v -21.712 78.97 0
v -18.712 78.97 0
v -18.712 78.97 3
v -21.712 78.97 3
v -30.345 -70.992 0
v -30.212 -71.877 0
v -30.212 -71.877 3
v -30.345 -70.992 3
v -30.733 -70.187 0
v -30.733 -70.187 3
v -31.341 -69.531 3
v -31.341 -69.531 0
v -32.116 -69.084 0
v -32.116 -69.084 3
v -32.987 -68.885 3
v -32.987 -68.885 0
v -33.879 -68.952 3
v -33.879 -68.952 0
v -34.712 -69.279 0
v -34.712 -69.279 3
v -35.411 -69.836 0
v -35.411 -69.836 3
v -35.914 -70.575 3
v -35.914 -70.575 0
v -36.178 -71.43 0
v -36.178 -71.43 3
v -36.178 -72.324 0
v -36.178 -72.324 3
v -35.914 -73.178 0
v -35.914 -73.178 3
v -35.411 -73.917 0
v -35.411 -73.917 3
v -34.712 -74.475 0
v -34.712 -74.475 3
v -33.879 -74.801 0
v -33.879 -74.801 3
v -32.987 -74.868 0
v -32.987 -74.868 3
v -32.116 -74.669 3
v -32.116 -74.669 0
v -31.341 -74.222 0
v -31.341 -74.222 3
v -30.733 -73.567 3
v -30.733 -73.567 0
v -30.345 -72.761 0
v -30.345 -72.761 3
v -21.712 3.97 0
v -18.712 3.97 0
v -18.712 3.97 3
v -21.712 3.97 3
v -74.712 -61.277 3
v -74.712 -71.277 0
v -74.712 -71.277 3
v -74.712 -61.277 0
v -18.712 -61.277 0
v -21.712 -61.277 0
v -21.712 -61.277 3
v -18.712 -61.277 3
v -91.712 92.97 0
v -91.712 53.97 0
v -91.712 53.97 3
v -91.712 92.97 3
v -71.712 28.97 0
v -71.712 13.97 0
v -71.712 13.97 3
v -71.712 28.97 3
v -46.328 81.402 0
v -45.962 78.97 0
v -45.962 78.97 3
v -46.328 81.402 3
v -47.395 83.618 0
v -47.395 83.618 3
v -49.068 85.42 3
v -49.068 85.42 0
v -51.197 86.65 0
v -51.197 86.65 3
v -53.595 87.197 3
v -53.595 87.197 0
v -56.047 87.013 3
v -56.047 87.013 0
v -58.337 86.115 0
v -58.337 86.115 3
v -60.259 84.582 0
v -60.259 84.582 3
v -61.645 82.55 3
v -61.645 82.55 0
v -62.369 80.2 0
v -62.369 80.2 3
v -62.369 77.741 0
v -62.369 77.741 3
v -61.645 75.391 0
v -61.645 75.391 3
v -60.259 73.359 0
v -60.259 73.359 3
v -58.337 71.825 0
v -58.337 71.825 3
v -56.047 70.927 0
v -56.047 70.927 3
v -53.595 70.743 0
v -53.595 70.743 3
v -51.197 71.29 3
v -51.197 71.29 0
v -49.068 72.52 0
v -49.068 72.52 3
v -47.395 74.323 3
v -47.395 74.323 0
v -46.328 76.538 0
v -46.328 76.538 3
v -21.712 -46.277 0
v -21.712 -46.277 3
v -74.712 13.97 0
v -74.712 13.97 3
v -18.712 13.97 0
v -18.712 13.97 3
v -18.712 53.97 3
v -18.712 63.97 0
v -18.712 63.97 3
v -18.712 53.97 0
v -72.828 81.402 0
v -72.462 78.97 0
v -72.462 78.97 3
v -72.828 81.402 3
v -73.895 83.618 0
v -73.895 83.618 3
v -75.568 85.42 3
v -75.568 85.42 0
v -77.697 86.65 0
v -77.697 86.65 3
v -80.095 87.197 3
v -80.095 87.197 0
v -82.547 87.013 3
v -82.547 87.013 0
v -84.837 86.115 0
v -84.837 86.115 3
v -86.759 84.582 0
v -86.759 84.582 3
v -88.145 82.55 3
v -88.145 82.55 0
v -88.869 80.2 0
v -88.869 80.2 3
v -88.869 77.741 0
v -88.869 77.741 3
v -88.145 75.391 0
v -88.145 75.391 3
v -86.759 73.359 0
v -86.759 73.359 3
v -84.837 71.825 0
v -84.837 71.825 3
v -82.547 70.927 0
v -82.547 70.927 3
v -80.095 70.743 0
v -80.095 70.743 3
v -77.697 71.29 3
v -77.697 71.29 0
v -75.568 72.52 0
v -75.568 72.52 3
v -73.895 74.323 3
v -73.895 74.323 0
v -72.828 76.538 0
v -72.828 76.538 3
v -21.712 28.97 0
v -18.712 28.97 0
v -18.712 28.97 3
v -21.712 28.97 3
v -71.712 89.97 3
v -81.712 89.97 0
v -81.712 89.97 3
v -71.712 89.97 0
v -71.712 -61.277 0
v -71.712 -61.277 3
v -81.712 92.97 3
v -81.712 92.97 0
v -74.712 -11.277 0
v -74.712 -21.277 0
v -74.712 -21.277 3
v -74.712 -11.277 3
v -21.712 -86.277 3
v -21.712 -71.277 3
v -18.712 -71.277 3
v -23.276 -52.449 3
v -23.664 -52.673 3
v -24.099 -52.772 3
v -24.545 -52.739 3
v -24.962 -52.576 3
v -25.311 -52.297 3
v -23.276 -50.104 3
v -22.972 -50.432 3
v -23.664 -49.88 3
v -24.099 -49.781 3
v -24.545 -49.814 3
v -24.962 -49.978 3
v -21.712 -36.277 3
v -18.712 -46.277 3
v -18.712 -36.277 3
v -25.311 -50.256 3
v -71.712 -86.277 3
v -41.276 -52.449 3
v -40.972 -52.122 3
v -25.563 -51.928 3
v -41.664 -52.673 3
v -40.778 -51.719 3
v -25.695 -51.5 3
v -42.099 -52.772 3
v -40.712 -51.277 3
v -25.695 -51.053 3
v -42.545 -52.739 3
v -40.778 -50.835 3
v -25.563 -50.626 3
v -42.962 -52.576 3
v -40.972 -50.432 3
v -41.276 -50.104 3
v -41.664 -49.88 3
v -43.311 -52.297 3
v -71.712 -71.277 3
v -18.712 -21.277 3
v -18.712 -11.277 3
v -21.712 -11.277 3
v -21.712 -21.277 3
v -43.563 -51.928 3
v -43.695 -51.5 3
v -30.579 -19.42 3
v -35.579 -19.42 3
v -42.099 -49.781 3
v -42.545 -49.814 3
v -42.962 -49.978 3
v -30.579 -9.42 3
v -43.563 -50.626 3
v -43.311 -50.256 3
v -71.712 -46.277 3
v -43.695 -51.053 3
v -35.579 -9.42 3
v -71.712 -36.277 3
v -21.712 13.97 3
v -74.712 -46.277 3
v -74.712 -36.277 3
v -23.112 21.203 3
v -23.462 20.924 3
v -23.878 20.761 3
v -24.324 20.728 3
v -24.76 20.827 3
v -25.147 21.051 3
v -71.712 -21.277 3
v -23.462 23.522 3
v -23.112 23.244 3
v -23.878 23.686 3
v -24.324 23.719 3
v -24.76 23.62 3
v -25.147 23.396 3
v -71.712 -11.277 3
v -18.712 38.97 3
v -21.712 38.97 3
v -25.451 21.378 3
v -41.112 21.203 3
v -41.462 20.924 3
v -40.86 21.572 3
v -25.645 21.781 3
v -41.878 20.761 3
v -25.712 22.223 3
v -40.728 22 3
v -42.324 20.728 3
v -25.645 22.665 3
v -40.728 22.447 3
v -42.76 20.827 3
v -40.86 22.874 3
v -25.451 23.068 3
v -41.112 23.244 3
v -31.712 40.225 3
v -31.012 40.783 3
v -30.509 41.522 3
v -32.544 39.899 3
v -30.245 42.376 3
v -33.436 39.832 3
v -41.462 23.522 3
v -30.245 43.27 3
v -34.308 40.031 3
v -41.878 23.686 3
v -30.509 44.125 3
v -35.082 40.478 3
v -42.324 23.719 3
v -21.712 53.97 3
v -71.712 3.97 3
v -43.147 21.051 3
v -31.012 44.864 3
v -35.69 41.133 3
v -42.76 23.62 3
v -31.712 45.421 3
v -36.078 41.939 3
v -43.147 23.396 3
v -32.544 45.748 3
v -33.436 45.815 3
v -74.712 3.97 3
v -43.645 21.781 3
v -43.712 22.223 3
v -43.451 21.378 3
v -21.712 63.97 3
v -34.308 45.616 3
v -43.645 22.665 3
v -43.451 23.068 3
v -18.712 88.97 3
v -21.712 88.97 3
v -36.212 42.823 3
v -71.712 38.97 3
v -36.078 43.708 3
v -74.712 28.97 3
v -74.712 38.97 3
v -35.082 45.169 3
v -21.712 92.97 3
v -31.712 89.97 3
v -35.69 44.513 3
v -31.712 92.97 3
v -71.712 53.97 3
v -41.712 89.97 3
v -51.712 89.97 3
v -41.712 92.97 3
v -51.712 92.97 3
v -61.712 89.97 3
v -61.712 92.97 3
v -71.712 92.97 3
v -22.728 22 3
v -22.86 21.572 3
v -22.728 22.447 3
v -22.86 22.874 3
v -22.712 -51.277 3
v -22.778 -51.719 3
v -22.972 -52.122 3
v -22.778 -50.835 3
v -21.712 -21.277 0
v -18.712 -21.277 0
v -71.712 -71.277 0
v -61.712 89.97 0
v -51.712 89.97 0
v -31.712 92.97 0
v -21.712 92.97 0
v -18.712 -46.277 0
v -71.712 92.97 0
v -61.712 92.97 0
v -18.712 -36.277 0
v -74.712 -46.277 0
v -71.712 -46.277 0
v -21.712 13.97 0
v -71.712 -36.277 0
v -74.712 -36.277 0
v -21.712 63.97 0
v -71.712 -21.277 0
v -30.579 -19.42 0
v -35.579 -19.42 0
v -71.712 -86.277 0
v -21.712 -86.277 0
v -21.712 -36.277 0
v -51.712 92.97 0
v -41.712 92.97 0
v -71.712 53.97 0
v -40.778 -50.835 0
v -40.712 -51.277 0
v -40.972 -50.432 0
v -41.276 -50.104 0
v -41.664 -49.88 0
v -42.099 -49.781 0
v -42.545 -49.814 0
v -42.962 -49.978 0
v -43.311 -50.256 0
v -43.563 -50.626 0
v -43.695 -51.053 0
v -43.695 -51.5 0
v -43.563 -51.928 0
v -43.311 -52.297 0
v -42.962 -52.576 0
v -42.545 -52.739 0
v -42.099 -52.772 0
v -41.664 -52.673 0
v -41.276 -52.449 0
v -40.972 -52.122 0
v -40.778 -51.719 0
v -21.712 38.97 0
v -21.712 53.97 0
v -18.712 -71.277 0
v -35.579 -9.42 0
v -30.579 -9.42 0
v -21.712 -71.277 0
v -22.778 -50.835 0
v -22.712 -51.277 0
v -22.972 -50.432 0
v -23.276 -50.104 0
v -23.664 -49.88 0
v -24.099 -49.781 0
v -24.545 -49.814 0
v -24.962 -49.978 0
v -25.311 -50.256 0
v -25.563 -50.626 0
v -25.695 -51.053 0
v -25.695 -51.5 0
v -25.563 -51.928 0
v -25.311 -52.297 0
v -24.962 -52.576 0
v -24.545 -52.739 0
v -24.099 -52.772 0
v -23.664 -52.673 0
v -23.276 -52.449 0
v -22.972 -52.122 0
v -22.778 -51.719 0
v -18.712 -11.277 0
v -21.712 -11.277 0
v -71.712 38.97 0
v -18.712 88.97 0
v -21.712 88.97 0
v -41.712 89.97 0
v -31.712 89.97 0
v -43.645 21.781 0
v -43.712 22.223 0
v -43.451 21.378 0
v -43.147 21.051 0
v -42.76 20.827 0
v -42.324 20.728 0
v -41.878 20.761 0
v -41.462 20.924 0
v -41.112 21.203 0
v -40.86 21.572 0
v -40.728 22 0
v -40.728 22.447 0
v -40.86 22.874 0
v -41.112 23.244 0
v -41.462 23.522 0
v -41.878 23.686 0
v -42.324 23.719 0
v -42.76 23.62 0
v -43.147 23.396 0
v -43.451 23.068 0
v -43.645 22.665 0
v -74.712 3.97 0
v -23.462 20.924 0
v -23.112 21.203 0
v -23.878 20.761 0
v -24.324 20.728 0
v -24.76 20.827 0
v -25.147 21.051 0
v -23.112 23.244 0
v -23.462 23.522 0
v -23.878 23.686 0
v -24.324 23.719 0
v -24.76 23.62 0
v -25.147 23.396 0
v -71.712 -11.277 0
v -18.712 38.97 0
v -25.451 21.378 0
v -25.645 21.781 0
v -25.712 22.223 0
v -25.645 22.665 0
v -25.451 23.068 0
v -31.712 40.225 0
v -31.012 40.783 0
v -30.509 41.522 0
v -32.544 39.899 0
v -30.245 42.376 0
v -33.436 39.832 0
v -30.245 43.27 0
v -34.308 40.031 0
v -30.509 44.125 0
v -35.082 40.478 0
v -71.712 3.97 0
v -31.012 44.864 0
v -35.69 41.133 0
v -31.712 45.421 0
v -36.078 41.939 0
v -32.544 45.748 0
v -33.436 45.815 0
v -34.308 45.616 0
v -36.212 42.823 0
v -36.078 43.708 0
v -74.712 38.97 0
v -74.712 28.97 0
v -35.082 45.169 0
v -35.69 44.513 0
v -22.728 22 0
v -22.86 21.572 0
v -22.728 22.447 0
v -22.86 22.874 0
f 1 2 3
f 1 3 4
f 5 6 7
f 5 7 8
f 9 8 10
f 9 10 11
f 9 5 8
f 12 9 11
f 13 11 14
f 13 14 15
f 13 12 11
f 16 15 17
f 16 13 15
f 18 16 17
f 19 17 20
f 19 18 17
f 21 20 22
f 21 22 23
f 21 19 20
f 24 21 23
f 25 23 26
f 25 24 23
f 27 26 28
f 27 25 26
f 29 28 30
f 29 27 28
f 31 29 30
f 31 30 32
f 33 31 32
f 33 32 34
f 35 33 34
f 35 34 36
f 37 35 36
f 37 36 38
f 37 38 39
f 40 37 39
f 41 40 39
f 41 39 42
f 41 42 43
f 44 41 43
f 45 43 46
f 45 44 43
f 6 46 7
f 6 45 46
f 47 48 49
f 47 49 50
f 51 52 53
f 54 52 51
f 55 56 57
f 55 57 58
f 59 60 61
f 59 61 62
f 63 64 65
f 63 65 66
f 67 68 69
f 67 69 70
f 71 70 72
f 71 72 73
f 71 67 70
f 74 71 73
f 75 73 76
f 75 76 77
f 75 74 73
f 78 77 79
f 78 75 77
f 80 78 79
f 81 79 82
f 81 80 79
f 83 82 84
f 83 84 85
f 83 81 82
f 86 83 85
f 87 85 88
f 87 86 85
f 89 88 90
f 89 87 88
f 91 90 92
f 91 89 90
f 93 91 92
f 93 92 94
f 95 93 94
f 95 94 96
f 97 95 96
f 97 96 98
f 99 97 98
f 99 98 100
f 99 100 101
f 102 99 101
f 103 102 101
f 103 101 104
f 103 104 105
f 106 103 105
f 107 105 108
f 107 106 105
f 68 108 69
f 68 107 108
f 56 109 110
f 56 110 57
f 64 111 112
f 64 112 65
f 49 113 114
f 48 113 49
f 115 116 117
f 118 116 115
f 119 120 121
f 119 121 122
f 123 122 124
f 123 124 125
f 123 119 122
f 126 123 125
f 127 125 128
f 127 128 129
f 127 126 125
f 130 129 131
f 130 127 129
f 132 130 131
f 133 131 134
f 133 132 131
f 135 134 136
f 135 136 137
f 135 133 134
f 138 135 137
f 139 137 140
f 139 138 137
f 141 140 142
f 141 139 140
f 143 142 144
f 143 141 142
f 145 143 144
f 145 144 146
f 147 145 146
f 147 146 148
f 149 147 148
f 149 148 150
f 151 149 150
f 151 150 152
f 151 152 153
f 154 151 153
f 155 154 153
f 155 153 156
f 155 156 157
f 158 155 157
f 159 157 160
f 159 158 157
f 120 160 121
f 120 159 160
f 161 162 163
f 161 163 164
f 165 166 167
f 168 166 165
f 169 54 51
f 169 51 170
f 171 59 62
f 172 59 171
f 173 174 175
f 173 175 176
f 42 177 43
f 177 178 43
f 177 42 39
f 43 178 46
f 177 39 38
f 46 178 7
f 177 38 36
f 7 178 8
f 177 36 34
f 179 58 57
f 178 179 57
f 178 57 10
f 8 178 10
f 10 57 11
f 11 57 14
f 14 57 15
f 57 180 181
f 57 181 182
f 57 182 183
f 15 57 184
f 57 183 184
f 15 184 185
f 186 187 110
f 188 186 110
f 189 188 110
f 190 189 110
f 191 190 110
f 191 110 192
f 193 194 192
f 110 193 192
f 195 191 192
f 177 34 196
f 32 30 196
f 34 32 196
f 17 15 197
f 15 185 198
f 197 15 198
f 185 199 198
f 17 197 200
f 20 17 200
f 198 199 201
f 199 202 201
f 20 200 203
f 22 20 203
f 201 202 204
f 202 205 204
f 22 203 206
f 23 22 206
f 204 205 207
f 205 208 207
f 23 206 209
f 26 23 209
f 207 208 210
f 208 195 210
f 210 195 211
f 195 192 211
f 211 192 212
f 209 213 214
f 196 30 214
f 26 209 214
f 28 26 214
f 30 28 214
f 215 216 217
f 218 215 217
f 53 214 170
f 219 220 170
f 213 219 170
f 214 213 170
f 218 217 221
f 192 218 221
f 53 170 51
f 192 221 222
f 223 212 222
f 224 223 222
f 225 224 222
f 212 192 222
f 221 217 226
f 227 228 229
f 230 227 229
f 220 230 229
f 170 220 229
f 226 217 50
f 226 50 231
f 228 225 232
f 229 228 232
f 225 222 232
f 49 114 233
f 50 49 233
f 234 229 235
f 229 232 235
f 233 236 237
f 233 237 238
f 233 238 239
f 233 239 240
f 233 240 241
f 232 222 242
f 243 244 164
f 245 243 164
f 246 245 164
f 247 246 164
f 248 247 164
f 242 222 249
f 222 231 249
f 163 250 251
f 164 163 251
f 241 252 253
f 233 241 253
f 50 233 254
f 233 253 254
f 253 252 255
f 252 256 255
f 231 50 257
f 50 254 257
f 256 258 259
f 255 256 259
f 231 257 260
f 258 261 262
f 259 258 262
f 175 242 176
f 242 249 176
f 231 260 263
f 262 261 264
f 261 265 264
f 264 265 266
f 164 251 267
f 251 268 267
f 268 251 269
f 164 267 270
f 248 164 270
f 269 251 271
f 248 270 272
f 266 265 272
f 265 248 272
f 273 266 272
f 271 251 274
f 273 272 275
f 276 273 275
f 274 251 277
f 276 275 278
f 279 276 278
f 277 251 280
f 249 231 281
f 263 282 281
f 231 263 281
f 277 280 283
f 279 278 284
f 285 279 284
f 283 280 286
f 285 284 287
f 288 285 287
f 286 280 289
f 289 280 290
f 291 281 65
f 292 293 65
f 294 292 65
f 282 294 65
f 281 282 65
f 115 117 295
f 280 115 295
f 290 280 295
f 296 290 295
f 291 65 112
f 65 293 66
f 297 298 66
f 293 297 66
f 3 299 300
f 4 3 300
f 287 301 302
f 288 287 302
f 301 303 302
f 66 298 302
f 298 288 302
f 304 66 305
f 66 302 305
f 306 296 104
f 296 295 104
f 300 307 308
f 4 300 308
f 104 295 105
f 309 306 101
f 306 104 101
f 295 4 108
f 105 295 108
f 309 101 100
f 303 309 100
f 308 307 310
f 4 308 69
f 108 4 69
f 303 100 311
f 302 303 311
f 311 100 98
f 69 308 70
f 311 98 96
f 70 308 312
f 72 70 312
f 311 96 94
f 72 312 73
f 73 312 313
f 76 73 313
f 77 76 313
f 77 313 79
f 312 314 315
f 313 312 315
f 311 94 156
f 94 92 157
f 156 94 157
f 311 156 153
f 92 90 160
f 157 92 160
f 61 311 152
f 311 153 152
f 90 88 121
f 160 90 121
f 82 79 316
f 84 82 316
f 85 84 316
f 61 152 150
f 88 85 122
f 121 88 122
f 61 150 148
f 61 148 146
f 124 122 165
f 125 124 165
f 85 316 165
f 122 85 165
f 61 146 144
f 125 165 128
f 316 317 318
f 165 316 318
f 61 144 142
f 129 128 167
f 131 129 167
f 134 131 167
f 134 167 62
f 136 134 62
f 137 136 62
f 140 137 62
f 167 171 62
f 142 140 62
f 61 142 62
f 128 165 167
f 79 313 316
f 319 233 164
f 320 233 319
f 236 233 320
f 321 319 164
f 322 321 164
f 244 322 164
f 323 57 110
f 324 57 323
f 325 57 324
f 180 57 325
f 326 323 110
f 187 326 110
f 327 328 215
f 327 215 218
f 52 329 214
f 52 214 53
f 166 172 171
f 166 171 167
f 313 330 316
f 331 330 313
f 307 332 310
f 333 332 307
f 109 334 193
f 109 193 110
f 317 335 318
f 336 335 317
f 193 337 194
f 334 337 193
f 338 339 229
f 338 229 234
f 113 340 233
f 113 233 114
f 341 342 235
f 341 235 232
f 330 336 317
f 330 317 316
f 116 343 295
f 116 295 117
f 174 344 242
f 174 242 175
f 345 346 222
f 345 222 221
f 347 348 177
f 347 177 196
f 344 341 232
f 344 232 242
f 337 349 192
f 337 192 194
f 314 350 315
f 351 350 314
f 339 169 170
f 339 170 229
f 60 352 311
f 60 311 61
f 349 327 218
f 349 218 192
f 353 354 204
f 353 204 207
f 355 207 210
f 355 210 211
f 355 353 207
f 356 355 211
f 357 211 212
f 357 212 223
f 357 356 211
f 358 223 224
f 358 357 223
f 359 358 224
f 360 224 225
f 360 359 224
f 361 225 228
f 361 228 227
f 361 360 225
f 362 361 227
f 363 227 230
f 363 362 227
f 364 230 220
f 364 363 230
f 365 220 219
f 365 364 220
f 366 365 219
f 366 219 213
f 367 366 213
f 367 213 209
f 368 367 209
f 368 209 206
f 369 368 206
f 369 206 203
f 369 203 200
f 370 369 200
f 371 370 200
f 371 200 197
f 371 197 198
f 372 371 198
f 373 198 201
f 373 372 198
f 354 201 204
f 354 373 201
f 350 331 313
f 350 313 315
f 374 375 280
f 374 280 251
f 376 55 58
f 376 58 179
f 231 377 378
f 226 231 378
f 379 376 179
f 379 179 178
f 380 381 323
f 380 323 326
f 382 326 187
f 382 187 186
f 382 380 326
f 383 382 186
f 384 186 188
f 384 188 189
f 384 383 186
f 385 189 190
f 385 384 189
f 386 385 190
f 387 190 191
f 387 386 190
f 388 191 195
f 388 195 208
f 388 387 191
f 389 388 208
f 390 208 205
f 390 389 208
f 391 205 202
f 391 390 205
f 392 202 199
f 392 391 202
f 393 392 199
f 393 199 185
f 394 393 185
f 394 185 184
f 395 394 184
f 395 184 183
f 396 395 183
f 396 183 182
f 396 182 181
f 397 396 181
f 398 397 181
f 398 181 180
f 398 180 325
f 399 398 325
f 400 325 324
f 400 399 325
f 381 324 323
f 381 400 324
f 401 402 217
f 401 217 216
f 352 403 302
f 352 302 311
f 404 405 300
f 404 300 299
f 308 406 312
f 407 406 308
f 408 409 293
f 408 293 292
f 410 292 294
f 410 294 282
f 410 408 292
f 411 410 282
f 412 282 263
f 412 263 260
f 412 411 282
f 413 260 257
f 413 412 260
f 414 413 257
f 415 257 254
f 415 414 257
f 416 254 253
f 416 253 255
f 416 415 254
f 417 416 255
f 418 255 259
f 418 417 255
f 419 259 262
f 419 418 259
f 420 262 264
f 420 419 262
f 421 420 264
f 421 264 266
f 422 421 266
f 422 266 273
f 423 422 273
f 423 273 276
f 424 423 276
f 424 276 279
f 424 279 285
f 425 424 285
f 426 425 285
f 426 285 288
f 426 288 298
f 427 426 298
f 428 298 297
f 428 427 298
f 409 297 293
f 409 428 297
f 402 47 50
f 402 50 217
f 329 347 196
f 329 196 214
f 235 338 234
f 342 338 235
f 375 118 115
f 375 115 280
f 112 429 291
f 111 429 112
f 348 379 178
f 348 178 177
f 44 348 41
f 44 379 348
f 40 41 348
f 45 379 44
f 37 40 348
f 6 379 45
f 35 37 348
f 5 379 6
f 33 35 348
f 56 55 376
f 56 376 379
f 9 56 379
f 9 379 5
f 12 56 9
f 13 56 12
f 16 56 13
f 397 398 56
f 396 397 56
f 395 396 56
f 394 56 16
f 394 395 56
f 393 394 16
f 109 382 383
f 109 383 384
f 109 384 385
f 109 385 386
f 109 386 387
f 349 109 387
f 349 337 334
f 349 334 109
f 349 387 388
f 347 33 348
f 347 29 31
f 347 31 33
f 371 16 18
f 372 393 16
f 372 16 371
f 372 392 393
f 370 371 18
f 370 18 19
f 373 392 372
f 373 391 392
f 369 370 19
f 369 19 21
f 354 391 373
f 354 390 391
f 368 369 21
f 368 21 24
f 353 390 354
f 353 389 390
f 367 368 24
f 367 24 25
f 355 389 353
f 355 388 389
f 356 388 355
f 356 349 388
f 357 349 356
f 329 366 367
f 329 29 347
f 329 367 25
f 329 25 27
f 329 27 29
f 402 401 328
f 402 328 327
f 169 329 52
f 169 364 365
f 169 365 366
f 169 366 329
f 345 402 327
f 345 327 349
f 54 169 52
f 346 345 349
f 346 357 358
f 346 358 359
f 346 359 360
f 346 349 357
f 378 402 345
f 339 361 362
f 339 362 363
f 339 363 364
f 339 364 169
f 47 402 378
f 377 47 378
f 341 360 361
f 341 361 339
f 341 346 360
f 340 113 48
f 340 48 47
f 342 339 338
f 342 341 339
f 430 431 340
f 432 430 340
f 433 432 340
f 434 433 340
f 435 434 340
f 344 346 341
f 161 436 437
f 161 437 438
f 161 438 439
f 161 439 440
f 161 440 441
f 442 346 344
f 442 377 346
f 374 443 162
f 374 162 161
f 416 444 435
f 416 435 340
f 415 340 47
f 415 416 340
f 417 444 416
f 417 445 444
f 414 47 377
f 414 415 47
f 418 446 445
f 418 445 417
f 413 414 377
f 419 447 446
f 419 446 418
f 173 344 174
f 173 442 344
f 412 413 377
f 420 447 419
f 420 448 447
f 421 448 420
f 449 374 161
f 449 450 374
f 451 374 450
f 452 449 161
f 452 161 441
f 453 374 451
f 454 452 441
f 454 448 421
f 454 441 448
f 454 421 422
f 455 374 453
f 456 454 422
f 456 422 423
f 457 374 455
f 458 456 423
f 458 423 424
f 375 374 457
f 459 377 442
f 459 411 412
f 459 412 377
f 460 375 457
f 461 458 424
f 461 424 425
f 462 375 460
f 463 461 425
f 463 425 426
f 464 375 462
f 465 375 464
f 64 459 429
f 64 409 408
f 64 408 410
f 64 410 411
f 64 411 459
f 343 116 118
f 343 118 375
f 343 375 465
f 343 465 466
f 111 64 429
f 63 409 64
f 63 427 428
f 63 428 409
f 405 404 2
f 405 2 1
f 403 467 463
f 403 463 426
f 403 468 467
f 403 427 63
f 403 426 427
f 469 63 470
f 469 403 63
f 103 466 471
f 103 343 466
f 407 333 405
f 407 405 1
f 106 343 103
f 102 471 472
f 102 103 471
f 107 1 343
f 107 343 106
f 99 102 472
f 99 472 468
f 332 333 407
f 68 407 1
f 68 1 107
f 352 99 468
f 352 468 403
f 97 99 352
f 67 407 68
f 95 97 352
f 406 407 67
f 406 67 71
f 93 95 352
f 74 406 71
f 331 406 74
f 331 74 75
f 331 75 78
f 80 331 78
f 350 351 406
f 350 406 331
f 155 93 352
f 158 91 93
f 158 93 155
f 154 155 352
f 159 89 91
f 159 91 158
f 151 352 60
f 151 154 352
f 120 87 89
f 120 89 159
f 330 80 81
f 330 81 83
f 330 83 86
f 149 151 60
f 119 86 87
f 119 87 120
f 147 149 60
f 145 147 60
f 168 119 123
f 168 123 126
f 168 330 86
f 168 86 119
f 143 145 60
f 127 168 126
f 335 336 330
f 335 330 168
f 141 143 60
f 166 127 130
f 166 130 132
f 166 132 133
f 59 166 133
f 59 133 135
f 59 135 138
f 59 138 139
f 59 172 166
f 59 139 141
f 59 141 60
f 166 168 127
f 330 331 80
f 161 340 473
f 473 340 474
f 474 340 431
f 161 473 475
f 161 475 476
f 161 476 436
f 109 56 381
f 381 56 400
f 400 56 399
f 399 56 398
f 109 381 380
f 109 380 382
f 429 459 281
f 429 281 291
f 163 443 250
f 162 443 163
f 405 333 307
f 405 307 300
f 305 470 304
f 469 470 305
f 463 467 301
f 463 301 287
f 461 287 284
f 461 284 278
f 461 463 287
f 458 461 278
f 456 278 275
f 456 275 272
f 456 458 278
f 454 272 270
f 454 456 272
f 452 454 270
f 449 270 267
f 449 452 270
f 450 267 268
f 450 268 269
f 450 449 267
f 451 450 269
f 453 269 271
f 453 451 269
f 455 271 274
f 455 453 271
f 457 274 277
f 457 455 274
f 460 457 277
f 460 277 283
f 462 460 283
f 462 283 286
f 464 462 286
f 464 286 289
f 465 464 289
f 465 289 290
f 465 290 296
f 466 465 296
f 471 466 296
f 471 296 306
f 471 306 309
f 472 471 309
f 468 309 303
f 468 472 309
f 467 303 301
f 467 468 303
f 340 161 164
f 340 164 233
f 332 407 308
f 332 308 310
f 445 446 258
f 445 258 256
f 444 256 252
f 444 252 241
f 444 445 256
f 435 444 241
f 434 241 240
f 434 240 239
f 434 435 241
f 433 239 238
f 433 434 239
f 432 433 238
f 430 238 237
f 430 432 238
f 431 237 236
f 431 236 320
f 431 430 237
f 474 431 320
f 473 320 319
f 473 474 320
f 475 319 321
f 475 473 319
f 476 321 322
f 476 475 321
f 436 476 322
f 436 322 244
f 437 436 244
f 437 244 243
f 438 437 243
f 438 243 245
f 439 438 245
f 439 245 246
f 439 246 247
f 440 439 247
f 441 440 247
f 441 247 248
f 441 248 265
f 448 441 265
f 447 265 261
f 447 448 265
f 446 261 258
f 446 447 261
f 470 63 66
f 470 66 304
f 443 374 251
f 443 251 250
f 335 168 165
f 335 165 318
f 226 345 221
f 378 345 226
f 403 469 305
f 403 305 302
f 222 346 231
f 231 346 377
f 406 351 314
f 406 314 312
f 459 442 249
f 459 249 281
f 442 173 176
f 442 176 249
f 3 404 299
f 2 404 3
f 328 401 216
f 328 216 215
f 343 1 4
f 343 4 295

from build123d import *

# Parameters (mm, degrees)
ESQUISSE2_R        = 1.5
ESQUISSE2_R_2      = 3
ESQUISSE2_R_3      = 8.25
ESQUISSE2_W        = 5
ESQUISSE2_H        = 10
BOSS_EXTRU_1_DEPTH = 3


with BuildPart() as part:
    # Esquisse2 → Boss.-Extru.1 (new body)
    with BuildSketch(Plane.XY):
        Polygon((-71.711544081, -86.276689775), (-71.711544081, -71.276689775), (-74.711544081, -71.276689775), (-74.711544081, -61.276689775), (-71.711544081, -61.276689775), (-71.711544081, -46.276689775), (-74.711544081, -46.276689775), (-74.711544081, -36.276689775), (-71.711544081, -36.276689775), (-71.711544081, -21.276689775), (-74.711544081, -21.276689775), (-74.711544081, -11.276689775), (-71.711544081, -11.276689775), (-71.711544081, 3.970120669), (-74.711544081, 3.970120669), (-74.711544081, 13.970120669), (-71.711544081, 13.970120669), (-71.711544081, 28.970120669), (-74.711544081, 28.970120669), (-74.711544081, 38.970120669), (-71.711544081, 38.970120669), (-71.711544081, 53.970120669), (-91.711544081, 53.970120669), (-91.711544081, 92.970120669), (-81.711544081, 92.970120669), (-81.711544081, 89.970120669), (-71.711544081, 89.970120669), (-71.711544081, 92.970120669), (-61.711544081, 92.970120669), (-61.711544081, 89.970120669), (-51.711544081, 89.970120669), (-51.711544081, 92.970120669), (-41.711544081, 92.970120669), (-41.711544081, 89.970120669), (-31.711544081, 89.970120669), (-31.711544081, 92.970120669), (-21.711544081, 92.970120669), (-21.711544081, 88.970120669), (-18.711544081, 88.970120669), (-18.711544081, 78.970120669), (-21.711544081, 78.970120669), (-21.711544081, 63.970120669), (-18.711544081, 63.970120669), (-18.711544081, 53.970120669), (-21.711544081, 53.970120669), (-21.711544081, 38.970120669), (-18.711544081, 38.970120669), (-18.711544081, 28.970120669), (-21.711544081, 28.970120669), (-21.711544081, 13.970120669), (-18.711544081, 13.970120669), (-18.711544081, 3.970120669), (-21.711544081, 3.970120669), (-21.711544081, -11.276689775), (-18.711544081, -11.276689775), (-18.711544081, -21.276689775), (-21.711544081, -21.276689775), (-21.711544081, -36.276689775), (-18.711544081, -36.276689775), (-18.711544081, -46.276689775), (-21.711544081, -46.276689775), (-21.711544081, -61.276689775), (-18.711544081, -61.276689775), (-18.711544081, -71.276689775), (-21.711544081, -71.276689775), (-21.711544081, -86.276689775), align=None)
        with Locations((-42.211544081, -51.276689775)):
            Circle(ESQUISSE2_R, mode=Mode.SUBTRACT)
        with Locations((-24.211544081, -51.276689775)):
            Circle(ESQUISSE2_R, mode=Mode.SUBTRACT)
        with Locations(Location((-33.211544081, 42.823310225, 0), (0, 0, 180))):
            Circle(ESQUISSE2_R_2, mode=Mode.SUBTRACT)
        with Locations(Location((-42.211544081, 22.223310225, 0), (0, 0, 180))):
            Circle(ESQUISSE2_R, mode=Mode.SUBTRACT)
        with Locations(Location((-24.211544081, 22.223310225, 0), (0, 0, 180))):
            Circle(ESQUISSE2_R, mode=Mode.SUBTRACT)
        with Locations((-80.711544081, 78.970120669)):
            Circle(ESQUISSE2_R_3, mode=Mode.SUBTRACT)
        with Locations((-54.211544081, 78.970120669)):
            Circle(ESQUISSE2_R_3, mode=Mode.SUBTRACT)
        with Locations((-33.211544081, -71.876689775)):
            Circle(ESQUISSE2_R_2, mode=Mode.SUBTRACT)
        with Locations((-33.078903677, -14.419560471)):
            Rectangle(ESQUISSE2_W, ESQUISSE2_H, mode=Mode.SUBTRACT)
    extrude(amount=BOSS_EXTRU_1_DEPTH)


solid = part.part
